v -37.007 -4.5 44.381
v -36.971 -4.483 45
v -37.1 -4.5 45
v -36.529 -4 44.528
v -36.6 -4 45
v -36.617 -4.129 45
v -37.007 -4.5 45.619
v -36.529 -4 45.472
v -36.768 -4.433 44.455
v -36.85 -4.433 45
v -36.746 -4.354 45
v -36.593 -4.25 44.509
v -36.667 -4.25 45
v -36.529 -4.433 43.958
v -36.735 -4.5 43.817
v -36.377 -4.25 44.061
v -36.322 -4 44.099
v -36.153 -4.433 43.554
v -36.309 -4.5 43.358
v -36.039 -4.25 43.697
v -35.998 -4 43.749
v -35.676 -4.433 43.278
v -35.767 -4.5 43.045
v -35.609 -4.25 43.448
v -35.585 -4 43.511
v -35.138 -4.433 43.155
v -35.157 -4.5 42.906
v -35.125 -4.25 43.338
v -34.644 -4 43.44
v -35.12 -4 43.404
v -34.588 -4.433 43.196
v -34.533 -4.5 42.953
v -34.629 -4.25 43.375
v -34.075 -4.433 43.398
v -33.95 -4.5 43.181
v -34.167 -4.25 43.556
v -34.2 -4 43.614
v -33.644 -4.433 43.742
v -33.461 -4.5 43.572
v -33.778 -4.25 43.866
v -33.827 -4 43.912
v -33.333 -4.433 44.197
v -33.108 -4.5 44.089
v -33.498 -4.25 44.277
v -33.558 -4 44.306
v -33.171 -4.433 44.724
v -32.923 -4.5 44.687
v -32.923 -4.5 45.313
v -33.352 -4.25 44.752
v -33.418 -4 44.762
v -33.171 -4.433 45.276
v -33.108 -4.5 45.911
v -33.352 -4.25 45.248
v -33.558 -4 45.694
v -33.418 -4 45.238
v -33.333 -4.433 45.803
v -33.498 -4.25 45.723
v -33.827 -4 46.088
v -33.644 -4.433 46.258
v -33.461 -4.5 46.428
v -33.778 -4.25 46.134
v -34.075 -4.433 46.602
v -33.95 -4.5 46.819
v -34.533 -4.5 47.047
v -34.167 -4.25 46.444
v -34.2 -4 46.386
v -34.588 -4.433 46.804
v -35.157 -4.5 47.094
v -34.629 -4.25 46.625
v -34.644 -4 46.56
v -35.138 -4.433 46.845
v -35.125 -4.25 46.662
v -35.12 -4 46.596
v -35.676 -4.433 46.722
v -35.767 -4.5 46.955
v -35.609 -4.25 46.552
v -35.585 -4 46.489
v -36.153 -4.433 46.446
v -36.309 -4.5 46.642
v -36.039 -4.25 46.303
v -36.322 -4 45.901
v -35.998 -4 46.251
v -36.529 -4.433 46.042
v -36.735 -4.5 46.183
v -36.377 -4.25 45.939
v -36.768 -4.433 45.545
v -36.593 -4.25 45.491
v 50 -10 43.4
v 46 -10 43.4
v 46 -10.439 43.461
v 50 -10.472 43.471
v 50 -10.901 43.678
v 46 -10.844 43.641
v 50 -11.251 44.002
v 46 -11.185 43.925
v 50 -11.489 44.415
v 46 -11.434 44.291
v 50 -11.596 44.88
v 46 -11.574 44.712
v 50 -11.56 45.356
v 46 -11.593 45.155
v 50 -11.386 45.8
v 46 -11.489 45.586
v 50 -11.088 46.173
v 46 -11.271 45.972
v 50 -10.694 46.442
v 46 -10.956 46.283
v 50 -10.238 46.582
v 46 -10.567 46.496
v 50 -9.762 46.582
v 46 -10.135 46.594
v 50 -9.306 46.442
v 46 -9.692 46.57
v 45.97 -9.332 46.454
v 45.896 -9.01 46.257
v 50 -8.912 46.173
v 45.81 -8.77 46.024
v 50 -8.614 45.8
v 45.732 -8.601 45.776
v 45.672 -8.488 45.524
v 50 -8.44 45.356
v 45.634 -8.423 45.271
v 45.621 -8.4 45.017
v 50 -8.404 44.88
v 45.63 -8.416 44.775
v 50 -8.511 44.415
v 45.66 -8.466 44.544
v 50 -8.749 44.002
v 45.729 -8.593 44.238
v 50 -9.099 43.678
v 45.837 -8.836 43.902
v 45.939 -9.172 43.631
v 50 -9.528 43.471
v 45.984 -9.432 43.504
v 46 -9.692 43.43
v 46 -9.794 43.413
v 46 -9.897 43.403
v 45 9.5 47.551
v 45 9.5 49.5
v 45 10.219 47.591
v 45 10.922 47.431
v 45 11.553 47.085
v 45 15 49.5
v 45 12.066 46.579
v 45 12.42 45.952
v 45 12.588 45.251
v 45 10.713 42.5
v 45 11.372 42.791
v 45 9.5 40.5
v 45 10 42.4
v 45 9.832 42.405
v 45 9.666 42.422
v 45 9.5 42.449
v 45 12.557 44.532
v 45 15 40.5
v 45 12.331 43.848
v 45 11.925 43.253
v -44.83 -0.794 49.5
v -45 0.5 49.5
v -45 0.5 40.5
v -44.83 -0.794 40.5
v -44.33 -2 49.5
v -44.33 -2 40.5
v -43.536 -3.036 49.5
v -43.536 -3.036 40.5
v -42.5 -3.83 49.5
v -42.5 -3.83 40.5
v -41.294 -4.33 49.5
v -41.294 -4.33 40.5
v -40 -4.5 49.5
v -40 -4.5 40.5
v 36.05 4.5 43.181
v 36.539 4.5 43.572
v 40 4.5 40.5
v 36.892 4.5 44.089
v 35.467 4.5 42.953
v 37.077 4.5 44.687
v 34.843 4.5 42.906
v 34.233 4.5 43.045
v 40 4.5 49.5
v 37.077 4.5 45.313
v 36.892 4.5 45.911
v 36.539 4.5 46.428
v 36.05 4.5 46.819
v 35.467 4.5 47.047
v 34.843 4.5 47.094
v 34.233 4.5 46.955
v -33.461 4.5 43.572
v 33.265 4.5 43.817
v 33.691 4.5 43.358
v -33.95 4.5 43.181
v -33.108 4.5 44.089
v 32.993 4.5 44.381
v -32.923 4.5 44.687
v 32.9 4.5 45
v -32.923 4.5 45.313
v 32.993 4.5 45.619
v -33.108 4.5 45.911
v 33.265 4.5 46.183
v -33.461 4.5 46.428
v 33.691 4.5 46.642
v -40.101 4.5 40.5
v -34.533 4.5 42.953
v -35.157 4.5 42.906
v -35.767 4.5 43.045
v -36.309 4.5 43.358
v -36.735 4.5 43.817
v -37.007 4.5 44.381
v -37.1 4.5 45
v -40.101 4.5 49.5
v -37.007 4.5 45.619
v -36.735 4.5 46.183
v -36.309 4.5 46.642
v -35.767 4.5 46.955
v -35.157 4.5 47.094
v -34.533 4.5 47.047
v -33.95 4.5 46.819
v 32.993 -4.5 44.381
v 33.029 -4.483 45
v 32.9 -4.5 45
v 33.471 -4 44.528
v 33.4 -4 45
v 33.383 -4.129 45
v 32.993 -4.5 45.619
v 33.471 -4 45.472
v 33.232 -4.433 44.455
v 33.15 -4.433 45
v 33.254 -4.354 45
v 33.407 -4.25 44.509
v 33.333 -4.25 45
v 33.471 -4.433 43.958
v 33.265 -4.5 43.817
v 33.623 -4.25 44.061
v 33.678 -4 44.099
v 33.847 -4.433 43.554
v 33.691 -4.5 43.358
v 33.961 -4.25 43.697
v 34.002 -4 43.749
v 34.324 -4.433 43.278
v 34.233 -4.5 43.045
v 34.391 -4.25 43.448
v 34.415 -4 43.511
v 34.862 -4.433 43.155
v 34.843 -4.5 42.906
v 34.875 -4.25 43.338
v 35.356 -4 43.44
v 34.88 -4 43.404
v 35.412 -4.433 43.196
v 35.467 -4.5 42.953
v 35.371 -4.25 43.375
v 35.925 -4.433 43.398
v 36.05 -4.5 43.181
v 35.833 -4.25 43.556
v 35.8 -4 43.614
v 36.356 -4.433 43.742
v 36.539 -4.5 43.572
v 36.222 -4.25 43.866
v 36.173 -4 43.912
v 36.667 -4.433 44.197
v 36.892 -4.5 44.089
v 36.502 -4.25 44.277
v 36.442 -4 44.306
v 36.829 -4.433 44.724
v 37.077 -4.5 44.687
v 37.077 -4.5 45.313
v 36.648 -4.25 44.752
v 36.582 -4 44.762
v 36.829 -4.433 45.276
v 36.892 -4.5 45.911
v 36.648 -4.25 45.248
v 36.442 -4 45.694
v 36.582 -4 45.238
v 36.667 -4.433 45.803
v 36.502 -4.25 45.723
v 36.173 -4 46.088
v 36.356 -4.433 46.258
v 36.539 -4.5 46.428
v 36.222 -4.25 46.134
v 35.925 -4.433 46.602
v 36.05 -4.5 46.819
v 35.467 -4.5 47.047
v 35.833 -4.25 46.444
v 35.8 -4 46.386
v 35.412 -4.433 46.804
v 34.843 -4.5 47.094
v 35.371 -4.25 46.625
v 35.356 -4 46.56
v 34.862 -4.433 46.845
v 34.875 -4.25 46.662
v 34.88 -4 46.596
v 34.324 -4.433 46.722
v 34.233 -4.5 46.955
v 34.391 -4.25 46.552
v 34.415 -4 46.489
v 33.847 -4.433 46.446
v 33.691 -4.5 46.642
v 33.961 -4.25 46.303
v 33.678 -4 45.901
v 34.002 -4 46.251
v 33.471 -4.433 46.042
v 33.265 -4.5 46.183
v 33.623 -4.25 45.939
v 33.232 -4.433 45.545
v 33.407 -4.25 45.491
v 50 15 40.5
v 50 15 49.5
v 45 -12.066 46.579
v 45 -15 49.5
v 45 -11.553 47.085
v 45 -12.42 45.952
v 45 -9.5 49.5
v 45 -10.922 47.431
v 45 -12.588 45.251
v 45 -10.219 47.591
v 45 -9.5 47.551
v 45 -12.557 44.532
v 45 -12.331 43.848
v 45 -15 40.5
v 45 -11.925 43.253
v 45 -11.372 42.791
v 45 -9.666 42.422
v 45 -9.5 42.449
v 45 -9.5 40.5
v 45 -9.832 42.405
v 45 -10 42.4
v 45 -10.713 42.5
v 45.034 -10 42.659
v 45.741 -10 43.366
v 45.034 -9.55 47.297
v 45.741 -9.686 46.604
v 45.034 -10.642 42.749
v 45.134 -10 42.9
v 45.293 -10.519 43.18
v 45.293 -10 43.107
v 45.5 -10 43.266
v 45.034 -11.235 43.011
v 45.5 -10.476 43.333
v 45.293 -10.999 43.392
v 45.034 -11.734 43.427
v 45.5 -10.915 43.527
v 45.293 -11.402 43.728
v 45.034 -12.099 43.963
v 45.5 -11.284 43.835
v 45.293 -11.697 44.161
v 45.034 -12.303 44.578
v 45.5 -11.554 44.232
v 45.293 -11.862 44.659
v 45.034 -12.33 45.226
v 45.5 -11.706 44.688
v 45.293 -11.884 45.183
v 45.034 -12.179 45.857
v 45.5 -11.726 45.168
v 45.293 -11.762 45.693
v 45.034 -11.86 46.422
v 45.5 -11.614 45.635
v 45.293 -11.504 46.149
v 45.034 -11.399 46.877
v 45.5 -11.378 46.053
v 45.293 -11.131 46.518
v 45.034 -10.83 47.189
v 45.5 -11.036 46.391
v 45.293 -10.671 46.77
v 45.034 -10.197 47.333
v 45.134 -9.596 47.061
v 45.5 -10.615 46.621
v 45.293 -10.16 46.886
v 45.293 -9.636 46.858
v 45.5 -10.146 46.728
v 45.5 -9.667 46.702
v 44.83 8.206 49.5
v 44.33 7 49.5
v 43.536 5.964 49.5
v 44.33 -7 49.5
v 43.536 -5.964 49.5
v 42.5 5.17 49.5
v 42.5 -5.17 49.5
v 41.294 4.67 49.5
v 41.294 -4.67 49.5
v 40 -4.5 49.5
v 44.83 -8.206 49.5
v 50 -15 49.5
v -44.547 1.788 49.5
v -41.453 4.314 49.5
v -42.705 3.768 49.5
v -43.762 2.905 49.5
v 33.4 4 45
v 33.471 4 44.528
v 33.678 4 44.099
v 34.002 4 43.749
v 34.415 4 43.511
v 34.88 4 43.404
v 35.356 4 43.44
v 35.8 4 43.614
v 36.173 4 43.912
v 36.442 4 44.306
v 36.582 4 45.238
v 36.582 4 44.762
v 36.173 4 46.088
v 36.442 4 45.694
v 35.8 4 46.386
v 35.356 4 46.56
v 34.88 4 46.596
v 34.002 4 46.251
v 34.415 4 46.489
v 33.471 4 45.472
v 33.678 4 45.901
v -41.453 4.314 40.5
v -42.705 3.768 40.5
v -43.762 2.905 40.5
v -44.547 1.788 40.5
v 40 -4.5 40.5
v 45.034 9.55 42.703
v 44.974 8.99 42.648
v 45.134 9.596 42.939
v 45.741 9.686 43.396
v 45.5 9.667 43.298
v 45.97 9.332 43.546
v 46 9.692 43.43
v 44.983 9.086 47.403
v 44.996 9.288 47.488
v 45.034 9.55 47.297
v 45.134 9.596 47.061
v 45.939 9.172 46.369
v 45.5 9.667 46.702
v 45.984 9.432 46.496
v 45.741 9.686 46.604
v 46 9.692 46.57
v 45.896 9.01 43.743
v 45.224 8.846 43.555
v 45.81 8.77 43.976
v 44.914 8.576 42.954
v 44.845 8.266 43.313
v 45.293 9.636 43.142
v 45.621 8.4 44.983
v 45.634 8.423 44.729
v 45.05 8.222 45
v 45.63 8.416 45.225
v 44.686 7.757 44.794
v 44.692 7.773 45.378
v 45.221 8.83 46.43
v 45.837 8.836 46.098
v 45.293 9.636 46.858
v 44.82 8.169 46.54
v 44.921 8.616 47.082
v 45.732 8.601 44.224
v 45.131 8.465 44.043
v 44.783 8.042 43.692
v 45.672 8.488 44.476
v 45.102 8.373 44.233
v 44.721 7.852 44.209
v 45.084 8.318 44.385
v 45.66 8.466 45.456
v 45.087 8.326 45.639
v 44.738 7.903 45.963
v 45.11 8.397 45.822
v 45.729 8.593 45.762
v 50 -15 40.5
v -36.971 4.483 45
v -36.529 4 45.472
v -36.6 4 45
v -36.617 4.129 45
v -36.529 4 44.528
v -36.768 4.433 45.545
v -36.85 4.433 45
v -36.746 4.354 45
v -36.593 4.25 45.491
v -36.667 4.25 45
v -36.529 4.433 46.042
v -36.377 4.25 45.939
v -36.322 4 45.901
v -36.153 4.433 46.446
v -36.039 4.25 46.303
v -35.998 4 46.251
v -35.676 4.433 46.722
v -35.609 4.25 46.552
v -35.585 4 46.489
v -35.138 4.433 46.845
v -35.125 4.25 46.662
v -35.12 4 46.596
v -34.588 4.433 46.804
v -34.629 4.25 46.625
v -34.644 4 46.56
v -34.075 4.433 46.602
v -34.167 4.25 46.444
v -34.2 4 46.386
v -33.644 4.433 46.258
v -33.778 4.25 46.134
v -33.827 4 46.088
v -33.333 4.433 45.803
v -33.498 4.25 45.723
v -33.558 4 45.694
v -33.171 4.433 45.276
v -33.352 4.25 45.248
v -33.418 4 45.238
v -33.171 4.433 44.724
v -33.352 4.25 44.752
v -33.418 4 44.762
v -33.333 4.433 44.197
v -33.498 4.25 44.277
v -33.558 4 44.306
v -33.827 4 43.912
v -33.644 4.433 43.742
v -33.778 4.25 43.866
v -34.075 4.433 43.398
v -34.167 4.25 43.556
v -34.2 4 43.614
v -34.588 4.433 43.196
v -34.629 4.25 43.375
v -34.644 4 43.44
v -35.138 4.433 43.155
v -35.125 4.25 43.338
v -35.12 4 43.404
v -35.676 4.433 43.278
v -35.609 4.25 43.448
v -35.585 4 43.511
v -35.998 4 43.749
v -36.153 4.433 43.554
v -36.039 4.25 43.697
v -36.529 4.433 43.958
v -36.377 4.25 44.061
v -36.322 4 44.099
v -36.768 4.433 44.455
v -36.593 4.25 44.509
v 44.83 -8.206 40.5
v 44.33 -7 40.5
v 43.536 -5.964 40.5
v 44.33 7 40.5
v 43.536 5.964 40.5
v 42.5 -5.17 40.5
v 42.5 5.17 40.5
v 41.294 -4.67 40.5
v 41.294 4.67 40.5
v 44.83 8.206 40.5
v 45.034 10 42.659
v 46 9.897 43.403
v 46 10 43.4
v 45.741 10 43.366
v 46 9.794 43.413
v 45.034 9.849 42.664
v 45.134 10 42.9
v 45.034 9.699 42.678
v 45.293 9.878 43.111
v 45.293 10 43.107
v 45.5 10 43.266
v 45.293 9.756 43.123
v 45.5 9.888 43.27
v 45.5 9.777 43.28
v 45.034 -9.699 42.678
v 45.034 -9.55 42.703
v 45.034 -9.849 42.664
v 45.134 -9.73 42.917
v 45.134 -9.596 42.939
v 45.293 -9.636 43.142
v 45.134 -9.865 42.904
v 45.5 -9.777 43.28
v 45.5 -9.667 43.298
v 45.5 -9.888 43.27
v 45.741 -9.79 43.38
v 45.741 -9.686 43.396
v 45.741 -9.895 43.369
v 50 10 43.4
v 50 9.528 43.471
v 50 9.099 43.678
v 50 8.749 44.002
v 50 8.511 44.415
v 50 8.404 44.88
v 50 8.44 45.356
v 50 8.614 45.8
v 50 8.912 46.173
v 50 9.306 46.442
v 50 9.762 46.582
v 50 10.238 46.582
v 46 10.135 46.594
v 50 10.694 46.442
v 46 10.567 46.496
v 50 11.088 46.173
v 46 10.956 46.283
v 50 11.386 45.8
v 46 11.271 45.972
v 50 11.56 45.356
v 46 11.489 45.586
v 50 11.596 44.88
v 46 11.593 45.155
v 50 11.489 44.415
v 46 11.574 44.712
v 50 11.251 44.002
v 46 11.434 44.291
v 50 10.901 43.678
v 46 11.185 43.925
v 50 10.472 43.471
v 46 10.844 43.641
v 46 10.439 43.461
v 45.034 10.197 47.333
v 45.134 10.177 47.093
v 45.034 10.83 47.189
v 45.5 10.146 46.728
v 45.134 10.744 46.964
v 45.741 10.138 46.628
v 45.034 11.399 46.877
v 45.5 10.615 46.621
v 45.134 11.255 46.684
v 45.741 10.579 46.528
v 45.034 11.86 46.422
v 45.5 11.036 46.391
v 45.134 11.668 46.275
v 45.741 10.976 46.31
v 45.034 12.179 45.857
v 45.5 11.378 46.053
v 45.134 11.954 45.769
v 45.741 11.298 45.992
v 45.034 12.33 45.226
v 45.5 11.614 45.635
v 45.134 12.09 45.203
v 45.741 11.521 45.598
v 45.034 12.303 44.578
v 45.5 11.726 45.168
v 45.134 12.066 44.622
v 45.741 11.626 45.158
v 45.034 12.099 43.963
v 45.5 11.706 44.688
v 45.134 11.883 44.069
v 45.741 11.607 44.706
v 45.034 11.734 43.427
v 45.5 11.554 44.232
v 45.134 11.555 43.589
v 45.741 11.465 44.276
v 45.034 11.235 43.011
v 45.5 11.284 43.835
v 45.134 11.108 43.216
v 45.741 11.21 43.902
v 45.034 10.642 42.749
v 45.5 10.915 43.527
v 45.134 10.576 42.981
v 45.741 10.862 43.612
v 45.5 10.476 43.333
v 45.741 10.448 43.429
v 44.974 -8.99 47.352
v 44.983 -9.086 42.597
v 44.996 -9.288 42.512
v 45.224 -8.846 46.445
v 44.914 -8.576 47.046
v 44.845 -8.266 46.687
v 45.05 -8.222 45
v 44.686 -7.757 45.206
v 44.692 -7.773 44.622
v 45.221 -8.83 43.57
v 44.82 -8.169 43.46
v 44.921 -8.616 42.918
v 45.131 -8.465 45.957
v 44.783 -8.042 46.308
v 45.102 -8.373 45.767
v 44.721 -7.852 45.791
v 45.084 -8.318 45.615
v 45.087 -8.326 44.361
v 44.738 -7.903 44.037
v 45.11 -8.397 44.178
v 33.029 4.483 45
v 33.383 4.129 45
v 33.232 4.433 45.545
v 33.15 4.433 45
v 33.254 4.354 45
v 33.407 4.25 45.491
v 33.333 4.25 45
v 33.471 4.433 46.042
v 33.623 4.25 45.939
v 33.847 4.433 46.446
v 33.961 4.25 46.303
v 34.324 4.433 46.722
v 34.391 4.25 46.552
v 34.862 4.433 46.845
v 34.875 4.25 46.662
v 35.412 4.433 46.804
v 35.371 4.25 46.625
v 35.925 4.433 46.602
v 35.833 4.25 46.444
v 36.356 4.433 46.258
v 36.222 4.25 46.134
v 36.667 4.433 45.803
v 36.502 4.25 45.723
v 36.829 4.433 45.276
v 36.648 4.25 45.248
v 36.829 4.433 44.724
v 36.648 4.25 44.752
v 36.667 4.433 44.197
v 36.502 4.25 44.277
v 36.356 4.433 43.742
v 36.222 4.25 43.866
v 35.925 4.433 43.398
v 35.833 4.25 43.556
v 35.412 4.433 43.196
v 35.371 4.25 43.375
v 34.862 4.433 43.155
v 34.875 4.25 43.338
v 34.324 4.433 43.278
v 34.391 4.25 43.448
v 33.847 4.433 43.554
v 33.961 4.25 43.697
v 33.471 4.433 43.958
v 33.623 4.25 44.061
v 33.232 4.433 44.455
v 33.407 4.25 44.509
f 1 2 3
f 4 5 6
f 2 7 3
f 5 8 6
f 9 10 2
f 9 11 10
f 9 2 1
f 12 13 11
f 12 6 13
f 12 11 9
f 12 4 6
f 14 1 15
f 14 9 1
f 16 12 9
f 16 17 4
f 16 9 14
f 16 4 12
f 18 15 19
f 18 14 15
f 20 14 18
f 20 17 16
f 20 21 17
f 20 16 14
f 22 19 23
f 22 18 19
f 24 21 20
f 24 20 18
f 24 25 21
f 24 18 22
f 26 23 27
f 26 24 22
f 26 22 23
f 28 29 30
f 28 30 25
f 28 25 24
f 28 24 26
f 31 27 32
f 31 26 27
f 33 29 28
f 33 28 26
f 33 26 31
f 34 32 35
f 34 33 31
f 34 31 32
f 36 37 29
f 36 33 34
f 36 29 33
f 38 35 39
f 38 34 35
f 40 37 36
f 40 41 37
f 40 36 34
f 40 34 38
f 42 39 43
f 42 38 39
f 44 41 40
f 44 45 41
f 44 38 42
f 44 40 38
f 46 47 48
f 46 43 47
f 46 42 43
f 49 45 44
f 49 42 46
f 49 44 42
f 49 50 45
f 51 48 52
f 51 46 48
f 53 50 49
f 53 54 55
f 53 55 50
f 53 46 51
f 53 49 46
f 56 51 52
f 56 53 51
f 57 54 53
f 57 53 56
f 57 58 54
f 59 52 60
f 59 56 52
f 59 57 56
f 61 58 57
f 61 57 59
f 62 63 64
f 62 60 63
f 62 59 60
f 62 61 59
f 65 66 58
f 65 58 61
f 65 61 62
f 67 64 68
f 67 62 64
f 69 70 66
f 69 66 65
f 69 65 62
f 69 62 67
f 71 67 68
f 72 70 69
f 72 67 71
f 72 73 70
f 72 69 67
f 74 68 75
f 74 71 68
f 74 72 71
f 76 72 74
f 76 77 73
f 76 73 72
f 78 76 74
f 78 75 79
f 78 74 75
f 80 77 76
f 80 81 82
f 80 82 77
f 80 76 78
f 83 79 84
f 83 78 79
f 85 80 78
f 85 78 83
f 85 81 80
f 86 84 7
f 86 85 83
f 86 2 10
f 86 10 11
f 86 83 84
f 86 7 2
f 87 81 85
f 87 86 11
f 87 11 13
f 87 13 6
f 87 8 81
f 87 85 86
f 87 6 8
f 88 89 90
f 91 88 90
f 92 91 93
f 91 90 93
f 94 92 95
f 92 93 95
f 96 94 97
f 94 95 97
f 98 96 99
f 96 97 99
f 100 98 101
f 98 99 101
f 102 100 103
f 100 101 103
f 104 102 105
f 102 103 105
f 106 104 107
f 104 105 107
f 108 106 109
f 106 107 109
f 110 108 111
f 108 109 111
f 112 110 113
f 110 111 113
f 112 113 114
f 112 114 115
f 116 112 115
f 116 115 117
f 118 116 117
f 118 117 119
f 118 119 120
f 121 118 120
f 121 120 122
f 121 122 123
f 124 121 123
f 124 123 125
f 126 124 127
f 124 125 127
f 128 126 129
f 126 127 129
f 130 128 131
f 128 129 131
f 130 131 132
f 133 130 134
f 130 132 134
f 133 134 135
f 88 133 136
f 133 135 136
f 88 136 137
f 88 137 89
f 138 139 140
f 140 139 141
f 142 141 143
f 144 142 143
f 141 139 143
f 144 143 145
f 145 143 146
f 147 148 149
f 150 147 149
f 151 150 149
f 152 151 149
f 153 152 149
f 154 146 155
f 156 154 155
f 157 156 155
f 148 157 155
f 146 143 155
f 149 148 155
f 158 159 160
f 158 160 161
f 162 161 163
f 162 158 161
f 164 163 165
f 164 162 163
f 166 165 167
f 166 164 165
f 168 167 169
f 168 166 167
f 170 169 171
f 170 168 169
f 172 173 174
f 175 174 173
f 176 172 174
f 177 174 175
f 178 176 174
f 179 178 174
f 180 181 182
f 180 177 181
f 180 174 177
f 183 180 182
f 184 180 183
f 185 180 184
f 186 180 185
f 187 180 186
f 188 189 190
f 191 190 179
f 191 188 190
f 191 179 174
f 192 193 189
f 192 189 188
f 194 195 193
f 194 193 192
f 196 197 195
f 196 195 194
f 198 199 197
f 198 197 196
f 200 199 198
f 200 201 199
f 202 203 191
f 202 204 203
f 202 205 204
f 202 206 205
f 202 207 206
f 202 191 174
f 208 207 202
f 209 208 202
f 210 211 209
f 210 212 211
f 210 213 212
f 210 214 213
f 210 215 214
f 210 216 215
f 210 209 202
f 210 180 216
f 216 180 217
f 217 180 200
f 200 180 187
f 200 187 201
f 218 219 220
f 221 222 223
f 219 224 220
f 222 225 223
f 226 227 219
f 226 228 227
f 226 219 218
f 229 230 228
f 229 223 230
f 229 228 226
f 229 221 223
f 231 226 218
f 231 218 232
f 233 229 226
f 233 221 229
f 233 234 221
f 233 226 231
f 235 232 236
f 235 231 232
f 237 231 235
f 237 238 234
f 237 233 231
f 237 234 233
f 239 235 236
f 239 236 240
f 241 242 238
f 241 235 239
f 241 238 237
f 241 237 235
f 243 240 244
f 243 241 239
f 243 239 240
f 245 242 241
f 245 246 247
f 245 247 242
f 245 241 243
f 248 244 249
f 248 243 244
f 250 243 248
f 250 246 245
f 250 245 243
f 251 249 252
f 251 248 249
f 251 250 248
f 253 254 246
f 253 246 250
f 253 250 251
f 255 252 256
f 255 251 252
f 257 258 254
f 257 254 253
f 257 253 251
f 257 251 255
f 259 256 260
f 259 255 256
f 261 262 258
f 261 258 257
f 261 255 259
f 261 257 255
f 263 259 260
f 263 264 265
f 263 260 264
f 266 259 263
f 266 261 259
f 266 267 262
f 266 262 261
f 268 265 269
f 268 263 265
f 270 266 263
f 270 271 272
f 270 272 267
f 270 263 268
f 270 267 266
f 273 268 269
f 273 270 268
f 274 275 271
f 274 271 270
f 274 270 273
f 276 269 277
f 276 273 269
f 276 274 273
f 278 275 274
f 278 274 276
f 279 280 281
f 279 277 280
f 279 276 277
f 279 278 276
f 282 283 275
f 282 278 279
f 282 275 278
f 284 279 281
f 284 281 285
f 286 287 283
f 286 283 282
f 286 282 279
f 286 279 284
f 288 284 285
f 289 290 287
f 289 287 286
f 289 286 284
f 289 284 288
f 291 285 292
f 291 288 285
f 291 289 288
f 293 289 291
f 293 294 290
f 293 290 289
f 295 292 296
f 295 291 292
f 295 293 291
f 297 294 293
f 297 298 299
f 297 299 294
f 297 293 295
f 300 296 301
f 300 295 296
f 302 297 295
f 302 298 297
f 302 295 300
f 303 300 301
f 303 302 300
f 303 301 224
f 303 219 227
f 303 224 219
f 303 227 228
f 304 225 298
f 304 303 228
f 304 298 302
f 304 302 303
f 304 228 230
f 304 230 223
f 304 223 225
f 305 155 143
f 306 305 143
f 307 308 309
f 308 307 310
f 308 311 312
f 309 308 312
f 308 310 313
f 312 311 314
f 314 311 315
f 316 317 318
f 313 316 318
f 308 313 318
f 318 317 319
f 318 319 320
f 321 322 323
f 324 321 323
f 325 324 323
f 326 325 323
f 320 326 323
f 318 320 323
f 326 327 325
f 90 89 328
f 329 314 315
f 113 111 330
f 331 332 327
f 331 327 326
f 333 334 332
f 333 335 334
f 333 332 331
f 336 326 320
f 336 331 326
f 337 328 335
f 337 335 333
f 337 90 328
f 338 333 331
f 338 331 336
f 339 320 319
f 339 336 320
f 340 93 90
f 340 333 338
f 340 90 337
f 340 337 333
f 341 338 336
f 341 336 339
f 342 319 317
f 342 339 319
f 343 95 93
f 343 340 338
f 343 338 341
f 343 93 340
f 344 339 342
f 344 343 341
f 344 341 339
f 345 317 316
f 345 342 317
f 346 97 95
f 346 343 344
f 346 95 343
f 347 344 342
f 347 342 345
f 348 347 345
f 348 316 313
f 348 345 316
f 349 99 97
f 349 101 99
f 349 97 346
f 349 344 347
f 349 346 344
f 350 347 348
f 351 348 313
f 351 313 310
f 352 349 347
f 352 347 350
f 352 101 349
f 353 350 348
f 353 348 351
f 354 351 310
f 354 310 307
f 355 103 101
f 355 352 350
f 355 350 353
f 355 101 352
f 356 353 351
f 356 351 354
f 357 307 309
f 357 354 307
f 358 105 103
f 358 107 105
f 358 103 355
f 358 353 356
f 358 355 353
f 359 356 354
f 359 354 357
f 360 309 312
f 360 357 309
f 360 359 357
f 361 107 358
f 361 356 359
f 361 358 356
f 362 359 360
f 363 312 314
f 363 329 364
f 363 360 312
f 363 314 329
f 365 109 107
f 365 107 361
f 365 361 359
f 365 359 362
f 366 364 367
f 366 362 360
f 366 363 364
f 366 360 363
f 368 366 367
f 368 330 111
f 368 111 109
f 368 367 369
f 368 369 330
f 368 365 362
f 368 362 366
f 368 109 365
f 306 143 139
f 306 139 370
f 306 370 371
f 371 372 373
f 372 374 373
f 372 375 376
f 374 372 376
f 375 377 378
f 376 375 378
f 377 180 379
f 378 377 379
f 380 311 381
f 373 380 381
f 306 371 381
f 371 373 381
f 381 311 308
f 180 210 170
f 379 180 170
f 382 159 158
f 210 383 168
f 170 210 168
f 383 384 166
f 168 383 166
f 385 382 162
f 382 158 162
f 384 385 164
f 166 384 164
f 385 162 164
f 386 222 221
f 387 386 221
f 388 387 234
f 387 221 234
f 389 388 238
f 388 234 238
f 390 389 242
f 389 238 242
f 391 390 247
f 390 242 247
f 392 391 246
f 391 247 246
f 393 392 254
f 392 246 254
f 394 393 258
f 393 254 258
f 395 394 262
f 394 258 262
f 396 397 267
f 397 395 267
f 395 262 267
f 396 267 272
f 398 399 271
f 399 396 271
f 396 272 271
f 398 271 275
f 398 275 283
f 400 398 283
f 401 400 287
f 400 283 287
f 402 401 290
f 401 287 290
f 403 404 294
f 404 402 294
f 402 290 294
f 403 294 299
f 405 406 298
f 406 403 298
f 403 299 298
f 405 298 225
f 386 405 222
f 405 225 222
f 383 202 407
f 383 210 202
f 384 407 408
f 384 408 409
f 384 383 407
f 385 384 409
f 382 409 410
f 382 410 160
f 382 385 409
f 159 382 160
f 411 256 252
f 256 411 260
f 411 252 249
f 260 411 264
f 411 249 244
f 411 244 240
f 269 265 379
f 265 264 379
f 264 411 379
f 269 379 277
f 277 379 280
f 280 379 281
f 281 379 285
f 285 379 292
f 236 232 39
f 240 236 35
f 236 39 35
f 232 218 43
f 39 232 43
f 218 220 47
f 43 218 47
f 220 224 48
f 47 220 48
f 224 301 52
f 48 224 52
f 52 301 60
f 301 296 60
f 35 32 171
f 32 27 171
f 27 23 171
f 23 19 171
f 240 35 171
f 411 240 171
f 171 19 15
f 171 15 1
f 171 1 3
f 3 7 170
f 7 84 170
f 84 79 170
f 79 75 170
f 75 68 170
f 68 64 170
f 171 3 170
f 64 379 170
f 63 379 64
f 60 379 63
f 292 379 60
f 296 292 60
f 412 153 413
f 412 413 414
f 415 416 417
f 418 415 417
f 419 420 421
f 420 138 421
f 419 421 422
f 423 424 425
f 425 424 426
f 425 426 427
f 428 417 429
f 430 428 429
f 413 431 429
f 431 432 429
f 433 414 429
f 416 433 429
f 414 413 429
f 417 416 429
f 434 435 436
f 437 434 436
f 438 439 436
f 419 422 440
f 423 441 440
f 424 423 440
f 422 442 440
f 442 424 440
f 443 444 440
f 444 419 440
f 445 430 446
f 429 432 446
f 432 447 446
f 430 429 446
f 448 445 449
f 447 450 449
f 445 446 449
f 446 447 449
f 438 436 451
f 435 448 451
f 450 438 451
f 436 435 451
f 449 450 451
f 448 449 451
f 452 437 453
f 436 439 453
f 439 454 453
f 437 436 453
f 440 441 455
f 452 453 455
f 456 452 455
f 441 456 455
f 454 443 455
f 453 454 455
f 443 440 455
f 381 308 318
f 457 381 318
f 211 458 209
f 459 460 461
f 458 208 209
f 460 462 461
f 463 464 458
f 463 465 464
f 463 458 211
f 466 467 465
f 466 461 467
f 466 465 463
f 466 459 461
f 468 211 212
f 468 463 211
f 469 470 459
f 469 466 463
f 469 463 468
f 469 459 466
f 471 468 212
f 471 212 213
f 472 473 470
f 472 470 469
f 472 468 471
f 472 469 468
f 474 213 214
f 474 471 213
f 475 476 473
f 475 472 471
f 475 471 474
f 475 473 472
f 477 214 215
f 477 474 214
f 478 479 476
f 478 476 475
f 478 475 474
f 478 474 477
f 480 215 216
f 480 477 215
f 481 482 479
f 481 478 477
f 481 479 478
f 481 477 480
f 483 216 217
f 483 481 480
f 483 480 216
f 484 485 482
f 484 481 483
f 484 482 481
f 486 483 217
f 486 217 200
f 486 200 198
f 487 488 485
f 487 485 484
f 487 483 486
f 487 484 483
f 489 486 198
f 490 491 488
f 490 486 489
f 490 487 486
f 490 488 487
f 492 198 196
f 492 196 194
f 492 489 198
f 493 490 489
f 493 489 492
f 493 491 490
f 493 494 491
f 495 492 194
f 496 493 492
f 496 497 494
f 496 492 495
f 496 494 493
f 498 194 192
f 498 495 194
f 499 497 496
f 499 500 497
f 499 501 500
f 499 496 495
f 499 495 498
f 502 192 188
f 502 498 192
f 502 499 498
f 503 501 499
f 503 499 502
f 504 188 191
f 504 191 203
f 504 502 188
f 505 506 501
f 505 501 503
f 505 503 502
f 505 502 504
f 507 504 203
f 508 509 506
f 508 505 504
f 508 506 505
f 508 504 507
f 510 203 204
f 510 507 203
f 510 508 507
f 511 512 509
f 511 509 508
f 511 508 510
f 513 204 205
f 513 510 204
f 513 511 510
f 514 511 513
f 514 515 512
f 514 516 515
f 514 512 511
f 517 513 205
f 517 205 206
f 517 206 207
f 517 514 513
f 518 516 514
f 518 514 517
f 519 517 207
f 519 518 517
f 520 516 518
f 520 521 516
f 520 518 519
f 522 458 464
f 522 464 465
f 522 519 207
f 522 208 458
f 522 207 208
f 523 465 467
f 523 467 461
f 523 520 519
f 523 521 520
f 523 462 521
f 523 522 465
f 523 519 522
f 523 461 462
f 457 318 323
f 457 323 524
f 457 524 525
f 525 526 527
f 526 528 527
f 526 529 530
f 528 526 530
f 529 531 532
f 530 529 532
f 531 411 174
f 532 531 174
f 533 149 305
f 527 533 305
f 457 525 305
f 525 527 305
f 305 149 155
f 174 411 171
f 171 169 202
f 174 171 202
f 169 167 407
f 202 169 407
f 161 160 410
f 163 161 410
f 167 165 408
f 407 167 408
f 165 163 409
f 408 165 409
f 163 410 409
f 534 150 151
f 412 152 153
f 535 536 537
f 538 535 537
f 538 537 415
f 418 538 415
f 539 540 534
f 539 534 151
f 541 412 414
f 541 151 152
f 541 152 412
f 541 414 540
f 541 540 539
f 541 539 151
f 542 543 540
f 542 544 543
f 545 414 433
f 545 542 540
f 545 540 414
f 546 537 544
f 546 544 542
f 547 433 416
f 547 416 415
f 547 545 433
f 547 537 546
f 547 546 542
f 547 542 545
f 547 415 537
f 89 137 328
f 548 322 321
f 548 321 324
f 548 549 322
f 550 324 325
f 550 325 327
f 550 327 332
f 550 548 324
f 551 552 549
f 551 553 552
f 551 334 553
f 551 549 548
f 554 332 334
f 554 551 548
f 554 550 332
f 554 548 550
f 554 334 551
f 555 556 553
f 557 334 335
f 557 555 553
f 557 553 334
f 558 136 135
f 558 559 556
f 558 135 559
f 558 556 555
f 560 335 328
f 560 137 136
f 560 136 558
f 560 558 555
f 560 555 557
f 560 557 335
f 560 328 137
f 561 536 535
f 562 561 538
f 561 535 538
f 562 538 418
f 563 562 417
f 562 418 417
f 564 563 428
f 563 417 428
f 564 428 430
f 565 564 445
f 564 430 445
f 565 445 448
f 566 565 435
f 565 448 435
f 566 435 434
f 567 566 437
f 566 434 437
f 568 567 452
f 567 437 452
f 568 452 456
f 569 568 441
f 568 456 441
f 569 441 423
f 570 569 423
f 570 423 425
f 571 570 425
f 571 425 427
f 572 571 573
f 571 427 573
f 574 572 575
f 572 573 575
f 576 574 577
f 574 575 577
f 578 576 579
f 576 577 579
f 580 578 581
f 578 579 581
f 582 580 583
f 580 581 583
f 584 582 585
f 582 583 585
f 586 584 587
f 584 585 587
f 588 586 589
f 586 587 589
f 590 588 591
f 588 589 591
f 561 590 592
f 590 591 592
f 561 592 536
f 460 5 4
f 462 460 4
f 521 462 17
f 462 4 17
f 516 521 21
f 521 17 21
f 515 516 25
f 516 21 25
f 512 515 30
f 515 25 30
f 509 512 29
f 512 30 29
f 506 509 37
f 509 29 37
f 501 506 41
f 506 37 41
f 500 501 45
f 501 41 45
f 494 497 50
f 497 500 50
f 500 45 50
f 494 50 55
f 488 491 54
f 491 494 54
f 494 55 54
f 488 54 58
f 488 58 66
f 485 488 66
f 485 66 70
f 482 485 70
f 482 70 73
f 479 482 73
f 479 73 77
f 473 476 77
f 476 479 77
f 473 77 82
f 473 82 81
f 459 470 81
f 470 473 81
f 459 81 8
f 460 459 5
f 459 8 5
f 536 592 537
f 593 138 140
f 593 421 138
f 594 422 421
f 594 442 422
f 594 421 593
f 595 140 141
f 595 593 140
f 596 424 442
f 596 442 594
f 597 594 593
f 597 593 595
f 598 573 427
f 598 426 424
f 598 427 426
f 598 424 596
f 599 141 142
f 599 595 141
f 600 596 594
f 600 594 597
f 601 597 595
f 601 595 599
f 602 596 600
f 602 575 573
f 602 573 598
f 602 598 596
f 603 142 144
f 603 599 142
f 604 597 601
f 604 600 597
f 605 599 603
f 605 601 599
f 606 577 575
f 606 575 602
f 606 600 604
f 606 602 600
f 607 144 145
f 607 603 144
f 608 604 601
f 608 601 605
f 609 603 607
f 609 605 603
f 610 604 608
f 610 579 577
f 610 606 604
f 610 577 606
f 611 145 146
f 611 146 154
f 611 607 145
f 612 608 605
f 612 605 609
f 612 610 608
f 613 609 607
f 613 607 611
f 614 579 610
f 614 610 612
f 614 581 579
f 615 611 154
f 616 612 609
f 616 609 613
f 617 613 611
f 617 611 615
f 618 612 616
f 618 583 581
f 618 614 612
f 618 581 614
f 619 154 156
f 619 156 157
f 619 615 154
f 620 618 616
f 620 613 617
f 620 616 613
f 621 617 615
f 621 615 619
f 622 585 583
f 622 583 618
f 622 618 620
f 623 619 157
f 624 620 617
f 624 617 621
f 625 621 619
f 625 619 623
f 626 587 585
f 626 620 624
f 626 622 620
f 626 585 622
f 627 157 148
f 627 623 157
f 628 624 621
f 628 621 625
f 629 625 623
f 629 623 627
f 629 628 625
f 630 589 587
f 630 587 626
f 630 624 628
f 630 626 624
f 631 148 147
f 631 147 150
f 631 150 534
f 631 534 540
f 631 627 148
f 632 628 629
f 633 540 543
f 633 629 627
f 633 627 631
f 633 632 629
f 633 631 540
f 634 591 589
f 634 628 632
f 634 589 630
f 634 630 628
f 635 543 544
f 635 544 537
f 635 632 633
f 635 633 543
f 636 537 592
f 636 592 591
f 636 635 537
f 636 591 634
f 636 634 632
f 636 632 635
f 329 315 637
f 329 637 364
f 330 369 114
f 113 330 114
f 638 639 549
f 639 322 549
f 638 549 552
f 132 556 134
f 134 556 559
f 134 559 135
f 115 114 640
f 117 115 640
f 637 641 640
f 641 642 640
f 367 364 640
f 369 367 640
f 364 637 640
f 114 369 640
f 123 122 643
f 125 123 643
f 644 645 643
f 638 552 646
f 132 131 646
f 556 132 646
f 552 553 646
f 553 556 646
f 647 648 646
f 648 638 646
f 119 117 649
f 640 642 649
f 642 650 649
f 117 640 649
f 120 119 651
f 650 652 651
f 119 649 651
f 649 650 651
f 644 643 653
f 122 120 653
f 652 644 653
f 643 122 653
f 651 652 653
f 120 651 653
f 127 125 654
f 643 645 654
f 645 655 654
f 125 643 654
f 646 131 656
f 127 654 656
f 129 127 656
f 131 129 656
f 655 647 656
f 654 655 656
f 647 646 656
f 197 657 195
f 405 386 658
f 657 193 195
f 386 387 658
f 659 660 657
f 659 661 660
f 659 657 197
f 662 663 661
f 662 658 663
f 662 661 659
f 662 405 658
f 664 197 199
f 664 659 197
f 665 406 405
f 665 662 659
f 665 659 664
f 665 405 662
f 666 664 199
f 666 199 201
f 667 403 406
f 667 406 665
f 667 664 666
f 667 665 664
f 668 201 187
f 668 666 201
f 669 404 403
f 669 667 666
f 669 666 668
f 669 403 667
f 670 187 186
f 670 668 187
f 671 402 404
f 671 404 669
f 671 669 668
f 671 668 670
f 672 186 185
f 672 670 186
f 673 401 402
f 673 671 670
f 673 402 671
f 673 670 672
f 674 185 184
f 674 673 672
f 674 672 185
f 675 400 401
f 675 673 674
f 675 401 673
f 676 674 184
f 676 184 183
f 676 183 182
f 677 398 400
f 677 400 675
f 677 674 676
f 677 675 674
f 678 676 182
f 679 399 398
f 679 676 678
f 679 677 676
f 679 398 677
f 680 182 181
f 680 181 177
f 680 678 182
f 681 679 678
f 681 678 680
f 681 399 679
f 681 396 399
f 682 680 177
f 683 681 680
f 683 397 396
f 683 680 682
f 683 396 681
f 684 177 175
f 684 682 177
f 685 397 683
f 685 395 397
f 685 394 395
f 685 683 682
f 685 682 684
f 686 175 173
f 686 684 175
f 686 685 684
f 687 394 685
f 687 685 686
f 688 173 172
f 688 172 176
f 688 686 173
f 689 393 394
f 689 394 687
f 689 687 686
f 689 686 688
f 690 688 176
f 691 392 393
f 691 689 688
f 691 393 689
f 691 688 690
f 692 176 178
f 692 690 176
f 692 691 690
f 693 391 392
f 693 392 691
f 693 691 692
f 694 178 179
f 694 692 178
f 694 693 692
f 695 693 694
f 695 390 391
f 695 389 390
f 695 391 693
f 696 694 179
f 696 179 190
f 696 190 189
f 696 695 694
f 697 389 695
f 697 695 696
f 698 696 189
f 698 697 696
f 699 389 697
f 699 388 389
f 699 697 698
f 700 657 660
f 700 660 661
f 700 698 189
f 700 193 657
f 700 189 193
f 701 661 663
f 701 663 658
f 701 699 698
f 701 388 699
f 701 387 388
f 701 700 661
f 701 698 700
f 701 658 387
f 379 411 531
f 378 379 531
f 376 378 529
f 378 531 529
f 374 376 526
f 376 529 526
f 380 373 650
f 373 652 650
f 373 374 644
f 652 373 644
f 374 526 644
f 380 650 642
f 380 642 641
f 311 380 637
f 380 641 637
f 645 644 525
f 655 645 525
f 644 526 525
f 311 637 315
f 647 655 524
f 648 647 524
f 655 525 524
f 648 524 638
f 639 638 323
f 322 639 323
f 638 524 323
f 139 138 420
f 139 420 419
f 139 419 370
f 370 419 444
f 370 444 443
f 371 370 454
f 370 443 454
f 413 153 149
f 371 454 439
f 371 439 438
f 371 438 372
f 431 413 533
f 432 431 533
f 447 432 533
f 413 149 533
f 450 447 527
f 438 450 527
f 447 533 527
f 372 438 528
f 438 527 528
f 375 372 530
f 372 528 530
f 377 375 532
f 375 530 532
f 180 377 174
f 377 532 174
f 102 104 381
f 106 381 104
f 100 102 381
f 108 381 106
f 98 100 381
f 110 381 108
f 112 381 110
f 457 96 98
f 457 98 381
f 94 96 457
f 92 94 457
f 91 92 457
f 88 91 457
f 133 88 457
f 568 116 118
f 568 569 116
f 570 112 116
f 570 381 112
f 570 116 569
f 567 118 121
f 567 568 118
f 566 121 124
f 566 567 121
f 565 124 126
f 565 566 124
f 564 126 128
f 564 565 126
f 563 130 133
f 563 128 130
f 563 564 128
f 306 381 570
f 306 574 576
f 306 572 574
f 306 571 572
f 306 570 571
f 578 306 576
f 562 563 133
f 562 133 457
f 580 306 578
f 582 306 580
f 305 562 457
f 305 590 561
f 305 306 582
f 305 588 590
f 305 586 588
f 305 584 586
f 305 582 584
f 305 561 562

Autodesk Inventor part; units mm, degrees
ref_plane "YZ Plane" through (0, 0, 0) normal (1, 0, 0) x (0, 1, 0)
ref_plane "XZ Plane" through (0, 0, 0) normal (0, 1, 0) x (-1, 0, 0)
ref_plane "XY Plane" through (0, 0, 0) normal (0, 0, 1) x (1, 0, 0)
sketch "Sketch1" plane through (0, 0, 0) normal (0, 1, 0) x (-1, 0, 0)
  line L0 (-35, 45) -> (35, 45) construction
  line L1 (35, 45) -> (35, -45) construction
  line L2 (35, -45) -> (-35, -45) construction
  line L3 (-35, -45) -> (-35, 45) construction
  line L4 (-35, 45) -> (35, -45) construction
  line L5 (35, 45) -> (-35, -45) construction
  circle A0 centre (35, 45) radius 1.6
  circle A1 centre (35, -45) radius 1.6 construction
  circle A2 centre (-35, -45) radius 1.6 construction
  circle A3 centre (-35, 45) radius 1.6
  line L6 (-45, 49.5) -> (45, 49.5)
  line L7 (45, 49.5) -> (45, 40.5)
  line L8 (45, 40.5) -> (-45, 40.5)
  line L9 (-45, 40.5) -> (-45, 49.5)
  line L10 (-45, 49.5) -> (45, 40.5) construction
  line L11 (45, 49.5) -> (-45, 40.5) construction
  point P0 (0, 0)
  point P1 (0, 45)
  dimension "d0" = 70
  dimension "d1" = 90
  dimension "d2" = 3.2
  dimension "d3" = 3.2
  dimension "d4" = 3.2
  dimension "d5" = 3.2
  dimension "d6" = 90
  dimension "d7" = 9
extrude "Extrusion1" add sketch "Sketch1" along normal mid plane 9
sketch "Sketch2" plane through (45, -4.5, 40.5) normal (1, 0, 0) x (0, 0, -1)
  line L0 (0, 0) -> (-9, 0) construction
  line L1 (0, 0) -> (-9, 0) construction
  line L2 (-9, 0) -> (-9, 9) construction
  line L3 (-9, 9) -> (0, 9) construction
  line L4 (0, 9) -> (0, 0) construction
  line L5 (-9, 0) -> (-9, 9) construction
  line L6 (-9, 0) -> (0, 9) construction
  line L7 (-9, 9) -> (0, 9) construction
  line L8 (-9, 9) -> (0, 0) construction
  line L9 (-9, -10.5) -> (0, -10.5)
  line L10 (0, -10.5) -> (0, 19.5)
  line L11 (0, 19.5) -> (-9, 19.5)
  line L12 (-9, 19.5) -> (-9, -10.5)
  line L13 (-9, -10.5) -> (0, 19.5) construction
  line L14 (0, -10.5) -> (-9, 19.5) construction
  line L15 (-4.5, 4.5) -> (-4.5, 14.5) construction
  line L16 (-4.5, 4.5) -> (-4.5, -5.5) construction
  circle A0 centre (-4.5, 14.5) radius 1.6
  circle A1 centre (-4.5, -5.5) radius 1.6
  point P0 (40.5, 4.5)
  dimension "d10" = 9
  dimension "d11" = 30
  dimension "d12" = 10
  dimension "d13" = 10
  dimension "d14" = 3.2
  dimension "d15" = 3.2
extrude "Extrusion2" add sketch "Sketch2" along normal blind 5
fillet "Fillet1" radius 5 2 edges at (45, -4.5, 45) (45, 4.5, 45)
fillet "Fillet2" radius 5 2 edges at (-45, -4.5, 45) (-45, 4.5, 45)
fillet "Fillet3" radius 1 6 edges at (44.8775, 8.4, 45) (45, 9.7468, 43.4202) (45, 11.5798, 45.2532) (44.8775, -8.4, 45) (45, -11.5798, 45.2532) (45, -9.7468, 43.4202)
fillet "Fillet4" radius 0.5 4 edges at (36.6, -4.5, 45) (-33.4, -4.5, 45) (-33.4, 4.5, 45) (36.6, 4.5, 45)
equation "\"d3\" = d2"
equation "\"d4\" = d2"
equation "\"d5\" = d2"
properties part number "PCB_STAND"
